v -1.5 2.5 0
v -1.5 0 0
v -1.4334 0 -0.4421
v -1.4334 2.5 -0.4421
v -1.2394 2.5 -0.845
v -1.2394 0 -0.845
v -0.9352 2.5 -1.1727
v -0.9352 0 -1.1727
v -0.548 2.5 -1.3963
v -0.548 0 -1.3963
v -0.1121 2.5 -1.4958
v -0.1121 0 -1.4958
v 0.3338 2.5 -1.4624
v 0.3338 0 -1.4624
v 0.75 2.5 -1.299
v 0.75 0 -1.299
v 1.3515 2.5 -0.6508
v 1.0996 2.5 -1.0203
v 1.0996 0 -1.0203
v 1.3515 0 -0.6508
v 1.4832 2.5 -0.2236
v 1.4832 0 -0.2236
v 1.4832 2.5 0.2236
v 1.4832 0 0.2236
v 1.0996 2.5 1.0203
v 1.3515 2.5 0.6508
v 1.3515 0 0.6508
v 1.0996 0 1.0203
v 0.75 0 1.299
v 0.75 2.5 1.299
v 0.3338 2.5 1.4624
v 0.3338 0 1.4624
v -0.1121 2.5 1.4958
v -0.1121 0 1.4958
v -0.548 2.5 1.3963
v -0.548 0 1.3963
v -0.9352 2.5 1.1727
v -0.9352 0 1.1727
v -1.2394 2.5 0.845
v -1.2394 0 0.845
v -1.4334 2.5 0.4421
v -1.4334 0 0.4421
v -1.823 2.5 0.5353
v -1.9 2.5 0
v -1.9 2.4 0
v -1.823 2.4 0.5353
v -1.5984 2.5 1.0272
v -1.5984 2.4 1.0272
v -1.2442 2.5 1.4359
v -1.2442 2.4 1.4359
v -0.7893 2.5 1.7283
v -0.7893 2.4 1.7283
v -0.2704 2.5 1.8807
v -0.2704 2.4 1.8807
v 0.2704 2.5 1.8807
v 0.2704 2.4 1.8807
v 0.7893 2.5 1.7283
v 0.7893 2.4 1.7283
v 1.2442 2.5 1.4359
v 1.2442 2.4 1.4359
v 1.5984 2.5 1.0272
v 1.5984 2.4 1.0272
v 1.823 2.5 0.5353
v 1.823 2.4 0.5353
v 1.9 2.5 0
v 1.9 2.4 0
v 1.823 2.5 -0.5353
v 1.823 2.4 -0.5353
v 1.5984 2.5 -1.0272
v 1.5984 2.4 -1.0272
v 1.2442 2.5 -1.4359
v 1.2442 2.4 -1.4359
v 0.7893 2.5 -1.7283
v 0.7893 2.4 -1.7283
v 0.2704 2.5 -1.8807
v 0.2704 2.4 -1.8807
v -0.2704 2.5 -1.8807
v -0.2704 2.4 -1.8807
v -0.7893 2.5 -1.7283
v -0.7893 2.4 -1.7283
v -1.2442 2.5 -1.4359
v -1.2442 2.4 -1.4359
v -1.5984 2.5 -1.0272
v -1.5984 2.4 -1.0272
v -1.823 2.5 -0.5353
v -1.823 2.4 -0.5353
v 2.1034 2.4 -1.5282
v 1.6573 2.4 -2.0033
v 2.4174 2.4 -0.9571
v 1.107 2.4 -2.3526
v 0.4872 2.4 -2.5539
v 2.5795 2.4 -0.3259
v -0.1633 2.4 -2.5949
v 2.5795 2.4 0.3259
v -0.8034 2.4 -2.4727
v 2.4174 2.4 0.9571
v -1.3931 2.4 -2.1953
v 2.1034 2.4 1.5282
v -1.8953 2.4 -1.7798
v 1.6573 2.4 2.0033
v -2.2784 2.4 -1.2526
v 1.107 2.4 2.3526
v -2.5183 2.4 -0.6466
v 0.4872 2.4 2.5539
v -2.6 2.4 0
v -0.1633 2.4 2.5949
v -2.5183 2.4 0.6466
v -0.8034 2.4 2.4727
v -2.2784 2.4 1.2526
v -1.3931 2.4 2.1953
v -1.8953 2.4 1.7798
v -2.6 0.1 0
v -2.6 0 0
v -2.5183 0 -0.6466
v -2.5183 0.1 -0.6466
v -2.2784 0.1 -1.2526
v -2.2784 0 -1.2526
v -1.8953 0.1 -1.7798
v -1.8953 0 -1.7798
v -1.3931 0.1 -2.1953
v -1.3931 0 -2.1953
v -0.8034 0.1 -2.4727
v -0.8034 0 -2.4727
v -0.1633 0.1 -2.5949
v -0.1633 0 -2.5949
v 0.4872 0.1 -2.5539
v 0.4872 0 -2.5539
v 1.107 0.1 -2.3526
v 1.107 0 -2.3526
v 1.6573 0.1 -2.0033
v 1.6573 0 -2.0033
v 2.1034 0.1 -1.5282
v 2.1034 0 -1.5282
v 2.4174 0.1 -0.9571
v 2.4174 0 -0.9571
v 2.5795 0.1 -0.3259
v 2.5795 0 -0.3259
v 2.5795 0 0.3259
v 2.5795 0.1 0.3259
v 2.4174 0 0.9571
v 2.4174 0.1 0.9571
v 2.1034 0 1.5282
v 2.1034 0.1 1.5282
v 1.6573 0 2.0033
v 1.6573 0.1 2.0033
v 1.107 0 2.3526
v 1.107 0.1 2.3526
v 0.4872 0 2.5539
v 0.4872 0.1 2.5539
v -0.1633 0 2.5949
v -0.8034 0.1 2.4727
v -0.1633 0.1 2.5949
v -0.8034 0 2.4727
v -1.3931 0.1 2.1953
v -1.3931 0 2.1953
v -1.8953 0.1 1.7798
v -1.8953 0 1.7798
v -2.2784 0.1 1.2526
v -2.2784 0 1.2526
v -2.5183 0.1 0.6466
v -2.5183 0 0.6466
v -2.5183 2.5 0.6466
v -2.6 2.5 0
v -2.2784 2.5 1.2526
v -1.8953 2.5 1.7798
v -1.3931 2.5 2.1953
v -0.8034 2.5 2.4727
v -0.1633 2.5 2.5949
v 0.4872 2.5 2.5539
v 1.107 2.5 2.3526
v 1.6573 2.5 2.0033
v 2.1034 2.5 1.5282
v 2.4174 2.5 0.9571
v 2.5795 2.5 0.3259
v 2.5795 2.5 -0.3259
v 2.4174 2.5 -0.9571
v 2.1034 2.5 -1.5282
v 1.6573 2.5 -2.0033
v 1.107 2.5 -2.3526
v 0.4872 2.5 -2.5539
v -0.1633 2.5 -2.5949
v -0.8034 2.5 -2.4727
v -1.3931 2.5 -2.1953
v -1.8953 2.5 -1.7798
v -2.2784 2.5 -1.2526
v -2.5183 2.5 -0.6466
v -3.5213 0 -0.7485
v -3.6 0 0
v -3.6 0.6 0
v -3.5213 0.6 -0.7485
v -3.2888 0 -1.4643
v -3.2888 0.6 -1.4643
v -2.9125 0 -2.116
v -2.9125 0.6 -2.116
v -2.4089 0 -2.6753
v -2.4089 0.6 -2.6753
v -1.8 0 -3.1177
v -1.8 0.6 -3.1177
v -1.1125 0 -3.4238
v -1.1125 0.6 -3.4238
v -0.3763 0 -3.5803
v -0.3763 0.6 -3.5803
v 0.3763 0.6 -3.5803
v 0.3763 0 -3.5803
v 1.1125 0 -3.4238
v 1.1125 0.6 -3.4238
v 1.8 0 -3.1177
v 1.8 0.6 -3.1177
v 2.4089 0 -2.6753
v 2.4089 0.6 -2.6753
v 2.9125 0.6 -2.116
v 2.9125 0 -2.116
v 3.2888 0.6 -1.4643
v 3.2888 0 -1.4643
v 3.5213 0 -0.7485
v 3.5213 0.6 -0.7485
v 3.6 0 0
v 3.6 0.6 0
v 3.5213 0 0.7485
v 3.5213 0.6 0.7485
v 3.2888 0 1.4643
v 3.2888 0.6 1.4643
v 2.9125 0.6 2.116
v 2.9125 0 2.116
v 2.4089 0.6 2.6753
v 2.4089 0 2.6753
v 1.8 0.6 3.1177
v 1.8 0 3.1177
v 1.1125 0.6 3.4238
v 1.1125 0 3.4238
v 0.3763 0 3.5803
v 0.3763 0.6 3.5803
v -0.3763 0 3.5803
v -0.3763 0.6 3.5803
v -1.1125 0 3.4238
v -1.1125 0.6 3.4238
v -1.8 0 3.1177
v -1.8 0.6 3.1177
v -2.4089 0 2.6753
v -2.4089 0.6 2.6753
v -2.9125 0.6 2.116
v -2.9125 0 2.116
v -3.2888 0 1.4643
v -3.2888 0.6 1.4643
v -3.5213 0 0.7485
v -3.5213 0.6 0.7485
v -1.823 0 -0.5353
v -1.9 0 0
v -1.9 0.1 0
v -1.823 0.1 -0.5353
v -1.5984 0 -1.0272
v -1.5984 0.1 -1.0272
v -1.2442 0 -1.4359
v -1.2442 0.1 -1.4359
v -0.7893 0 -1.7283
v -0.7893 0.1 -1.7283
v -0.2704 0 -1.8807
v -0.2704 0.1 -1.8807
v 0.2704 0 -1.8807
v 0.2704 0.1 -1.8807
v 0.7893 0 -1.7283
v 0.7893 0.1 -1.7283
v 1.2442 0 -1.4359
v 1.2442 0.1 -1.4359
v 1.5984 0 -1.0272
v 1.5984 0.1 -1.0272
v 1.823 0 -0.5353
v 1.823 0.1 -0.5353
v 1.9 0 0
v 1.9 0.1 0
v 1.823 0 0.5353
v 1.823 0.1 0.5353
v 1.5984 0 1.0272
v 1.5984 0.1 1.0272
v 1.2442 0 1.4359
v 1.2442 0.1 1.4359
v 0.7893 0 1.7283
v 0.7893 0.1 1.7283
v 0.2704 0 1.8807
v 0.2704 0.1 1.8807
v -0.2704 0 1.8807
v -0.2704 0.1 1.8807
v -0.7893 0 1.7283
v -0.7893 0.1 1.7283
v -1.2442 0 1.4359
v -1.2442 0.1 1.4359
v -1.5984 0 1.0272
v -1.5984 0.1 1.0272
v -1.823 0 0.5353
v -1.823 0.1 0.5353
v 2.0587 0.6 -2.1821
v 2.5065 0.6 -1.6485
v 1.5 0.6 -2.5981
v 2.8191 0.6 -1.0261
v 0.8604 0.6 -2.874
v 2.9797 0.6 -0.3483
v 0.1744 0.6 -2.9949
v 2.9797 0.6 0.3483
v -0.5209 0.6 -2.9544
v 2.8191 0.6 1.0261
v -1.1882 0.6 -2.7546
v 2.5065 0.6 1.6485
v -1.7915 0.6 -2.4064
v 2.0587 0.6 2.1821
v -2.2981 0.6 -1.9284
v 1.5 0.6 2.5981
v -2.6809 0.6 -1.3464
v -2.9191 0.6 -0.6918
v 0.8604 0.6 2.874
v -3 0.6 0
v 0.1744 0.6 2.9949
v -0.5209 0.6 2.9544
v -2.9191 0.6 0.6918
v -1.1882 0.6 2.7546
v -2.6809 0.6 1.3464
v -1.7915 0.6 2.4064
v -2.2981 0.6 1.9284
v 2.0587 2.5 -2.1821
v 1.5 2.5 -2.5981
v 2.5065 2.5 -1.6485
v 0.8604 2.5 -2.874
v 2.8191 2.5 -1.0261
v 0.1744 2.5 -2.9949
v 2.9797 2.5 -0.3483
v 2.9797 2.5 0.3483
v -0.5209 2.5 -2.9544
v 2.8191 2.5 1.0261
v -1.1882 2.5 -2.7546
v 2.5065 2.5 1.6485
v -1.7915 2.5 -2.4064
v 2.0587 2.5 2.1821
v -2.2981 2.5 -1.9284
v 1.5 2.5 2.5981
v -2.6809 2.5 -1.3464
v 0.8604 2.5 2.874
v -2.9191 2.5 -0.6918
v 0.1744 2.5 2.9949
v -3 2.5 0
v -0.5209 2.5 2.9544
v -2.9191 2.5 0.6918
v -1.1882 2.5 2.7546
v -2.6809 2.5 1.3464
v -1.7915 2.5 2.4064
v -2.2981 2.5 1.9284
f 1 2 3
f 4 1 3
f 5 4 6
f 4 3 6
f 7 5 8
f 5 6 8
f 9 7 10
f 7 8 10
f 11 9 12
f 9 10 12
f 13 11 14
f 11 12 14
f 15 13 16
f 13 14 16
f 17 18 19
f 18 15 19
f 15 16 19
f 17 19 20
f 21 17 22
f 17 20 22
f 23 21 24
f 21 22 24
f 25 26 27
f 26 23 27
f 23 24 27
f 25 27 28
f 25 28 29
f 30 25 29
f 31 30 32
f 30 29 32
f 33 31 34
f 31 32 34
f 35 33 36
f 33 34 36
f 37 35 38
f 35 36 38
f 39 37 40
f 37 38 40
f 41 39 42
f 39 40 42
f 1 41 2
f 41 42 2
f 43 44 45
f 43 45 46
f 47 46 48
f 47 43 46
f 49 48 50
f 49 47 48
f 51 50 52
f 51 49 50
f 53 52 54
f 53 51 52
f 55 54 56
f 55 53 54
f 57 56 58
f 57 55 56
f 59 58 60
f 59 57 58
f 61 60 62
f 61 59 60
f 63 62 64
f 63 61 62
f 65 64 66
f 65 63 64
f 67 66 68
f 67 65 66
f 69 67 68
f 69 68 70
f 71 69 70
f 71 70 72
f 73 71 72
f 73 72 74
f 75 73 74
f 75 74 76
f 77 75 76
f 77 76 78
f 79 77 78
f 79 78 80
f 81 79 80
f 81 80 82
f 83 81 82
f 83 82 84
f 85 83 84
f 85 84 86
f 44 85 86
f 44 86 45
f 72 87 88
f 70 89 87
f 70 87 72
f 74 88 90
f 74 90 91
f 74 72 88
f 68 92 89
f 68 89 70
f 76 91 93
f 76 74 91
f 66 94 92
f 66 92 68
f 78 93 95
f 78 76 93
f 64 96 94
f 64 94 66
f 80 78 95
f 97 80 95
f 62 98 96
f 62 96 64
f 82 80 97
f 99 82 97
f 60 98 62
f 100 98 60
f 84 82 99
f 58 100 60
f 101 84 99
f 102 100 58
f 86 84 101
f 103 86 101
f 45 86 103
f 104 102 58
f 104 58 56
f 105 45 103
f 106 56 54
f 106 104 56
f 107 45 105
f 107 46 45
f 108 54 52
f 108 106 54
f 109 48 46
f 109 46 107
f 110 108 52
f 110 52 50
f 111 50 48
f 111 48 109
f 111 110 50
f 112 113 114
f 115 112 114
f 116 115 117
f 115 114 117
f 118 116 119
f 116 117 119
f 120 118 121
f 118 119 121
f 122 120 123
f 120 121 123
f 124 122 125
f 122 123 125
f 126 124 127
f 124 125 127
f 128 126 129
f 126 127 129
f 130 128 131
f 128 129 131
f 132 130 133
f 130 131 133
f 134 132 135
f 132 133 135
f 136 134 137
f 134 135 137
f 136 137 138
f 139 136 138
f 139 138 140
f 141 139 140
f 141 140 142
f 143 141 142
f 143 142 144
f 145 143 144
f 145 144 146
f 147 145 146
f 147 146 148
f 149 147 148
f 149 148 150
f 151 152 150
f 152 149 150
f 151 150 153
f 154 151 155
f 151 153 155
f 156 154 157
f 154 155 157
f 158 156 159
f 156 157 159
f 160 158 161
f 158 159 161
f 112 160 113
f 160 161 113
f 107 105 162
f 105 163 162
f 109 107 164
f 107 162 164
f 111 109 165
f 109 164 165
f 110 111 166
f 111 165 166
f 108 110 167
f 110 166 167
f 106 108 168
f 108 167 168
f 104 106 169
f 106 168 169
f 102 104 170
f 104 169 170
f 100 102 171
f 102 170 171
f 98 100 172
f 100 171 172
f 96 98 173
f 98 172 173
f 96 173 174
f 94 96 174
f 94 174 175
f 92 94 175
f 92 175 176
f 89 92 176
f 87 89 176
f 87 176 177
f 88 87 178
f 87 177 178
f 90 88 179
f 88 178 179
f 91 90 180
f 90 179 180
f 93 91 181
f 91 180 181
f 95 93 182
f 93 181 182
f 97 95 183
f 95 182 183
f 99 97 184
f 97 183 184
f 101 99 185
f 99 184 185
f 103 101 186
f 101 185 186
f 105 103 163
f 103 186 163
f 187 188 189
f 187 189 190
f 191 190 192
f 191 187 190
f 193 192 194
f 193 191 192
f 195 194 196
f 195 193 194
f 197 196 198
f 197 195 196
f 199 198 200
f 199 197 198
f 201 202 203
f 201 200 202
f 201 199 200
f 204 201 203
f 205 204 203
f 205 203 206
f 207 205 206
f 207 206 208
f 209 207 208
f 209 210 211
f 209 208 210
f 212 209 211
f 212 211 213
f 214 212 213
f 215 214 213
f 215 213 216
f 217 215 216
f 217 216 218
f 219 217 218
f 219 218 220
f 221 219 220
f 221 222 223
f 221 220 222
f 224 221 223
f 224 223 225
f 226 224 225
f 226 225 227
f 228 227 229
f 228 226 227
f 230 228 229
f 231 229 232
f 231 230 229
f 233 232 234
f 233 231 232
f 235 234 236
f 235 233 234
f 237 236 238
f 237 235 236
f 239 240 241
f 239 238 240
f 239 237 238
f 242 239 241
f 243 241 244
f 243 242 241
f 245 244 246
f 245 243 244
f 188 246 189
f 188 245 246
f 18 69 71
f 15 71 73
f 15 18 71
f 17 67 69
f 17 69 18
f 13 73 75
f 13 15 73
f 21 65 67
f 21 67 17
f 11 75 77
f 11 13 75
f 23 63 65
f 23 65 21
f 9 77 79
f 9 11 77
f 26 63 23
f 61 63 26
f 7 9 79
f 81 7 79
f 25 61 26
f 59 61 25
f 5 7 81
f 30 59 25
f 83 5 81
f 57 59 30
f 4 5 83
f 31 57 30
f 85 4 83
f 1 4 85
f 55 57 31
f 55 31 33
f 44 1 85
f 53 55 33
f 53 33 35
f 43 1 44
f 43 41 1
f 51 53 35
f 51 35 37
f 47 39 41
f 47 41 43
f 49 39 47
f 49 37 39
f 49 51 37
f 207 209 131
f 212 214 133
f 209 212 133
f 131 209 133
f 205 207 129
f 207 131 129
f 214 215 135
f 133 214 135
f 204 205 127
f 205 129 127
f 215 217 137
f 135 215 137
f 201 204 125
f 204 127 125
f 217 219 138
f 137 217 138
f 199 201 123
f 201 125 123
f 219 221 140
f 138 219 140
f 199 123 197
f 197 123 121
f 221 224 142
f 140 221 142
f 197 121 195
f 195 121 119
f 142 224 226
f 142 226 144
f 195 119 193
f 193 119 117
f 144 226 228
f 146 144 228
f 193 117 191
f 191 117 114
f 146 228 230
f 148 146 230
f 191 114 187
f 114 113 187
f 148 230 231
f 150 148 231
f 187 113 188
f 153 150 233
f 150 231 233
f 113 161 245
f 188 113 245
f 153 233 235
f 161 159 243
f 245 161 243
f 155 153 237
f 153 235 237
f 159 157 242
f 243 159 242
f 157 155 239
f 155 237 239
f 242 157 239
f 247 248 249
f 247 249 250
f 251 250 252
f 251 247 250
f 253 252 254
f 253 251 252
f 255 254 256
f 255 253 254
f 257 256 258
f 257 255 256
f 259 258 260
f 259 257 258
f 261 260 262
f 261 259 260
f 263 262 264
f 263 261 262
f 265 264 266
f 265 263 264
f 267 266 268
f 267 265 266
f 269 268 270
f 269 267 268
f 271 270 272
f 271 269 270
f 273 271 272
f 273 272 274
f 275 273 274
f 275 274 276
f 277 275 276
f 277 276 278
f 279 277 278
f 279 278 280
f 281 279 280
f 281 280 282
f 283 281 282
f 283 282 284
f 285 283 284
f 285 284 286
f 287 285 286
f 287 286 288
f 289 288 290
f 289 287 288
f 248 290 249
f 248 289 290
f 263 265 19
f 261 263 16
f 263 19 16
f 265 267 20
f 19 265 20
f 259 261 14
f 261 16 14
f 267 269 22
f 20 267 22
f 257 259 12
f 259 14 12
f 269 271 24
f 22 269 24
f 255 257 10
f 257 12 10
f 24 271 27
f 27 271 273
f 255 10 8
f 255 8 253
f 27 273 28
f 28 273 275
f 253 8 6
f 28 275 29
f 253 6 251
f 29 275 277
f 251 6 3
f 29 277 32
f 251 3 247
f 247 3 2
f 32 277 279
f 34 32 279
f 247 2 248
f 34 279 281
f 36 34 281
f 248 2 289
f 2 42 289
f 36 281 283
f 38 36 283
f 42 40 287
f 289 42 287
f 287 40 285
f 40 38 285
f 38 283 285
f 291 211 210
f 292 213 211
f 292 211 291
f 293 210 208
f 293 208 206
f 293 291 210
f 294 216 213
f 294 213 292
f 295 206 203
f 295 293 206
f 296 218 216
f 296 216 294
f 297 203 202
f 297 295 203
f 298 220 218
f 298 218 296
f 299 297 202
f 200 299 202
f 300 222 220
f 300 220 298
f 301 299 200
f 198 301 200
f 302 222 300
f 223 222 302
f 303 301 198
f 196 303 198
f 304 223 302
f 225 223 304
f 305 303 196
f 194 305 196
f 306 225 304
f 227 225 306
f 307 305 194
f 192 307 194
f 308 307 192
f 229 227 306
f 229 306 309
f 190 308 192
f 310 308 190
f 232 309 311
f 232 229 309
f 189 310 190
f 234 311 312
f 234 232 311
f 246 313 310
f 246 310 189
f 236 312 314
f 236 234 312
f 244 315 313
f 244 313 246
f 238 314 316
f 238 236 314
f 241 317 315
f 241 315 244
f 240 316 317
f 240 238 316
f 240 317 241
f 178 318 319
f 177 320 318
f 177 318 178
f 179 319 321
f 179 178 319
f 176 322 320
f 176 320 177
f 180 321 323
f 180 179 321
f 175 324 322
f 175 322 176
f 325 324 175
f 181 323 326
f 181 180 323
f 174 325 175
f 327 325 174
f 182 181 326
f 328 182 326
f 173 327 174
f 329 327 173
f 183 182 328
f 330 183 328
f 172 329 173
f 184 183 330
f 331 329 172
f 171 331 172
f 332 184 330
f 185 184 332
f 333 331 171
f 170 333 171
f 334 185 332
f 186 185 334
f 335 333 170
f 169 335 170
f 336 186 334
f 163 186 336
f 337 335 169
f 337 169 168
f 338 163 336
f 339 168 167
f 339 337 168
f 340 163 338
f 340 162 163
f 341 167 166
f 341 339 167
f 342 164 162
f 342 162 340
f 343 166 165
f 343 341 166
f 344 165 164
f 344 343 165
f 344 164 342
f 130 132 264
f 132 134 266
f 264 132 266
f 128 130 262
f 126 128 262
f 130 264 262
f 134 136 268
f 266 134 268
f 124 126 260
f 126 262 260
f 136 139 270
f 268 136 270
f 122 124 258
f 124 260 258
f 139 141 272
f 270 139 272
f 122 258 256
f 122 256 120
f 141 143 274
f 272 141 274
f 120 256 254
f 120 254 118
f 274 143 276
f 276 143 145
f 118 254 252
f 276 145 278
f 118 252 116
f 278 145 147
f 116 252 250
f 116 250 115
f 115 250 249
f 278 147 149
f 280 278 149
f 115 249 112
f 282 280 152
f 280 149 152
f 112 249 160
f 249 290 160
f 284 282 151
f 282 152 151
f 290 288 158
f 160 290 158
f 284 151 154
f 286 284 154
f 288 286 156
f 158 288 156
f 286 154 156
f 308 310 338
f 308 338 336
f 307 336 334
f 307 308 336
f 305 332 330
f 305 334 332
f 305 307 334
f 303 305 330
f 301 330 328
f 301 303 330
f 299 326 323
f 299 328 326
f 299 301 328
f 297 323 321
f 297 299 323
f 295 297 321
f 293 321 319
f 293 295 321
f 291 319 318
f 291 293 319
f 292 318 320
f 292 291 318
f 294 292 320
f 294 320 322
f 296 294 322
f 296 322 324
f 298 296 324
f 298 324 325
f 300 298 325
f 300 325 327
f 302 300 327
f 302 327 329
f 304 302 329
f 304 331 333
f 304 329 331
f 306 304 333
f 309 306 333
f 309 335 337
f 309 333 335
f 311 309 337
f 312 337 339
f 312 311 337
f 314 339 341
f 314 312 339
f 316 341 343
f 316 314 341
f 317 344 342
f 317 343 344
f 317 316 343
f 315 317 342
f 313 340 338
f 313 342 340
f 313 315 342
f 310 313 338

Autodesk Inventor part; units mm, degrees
ref_plane "YZ Plane" through (0, 0, 0) normal (1, 0, 0) x (0, 1, 0)
ref_plane "XZ Plane" through (0, 0, 0) normal (0, 1, 0) x (-1, 0, 0)
ref_plane "XY Plane" through (0, 0, 0) normal (0, 0, 1) x (1, 0, 0)
sketch "Sketch1" plane through (0, 0, 0) normal (0, 1, 0) x (-1, 0, 0)
  circle A0 centre (0, 0) radius 3
  circle A1 centre (0, 0) radius 1.5
  circle A2 centre (0, 0) radius 3.6
  circle A3 centre (0, 0) radius 1.9
  circle A4 centre (0, 0) radius 2.6
  dimension "d0" = 6
  dimension "d1" = 3
  dimension "d2" = 7.2
  dimension "d3" = 0.4
  dimension "d4" = 0.4
extrude "Extrusion1" add sketch "Sketch1" along normal blind 2.5 contours A0 | A3 | A4
extrude "Extrusion2" add sketch "Sketch1" along normal blind 0.6 contours A2
extrude "Extrusion3" cut sketch "Sketch1" along normal blind 0.1 contours A4
extrude "Extrusion4" cut sketch "Sketch1" against normal blind 0.1 from surface at 2.5 contours A4
properties part number "Miniatur Flanschkugellager MF 74 ZZ"
